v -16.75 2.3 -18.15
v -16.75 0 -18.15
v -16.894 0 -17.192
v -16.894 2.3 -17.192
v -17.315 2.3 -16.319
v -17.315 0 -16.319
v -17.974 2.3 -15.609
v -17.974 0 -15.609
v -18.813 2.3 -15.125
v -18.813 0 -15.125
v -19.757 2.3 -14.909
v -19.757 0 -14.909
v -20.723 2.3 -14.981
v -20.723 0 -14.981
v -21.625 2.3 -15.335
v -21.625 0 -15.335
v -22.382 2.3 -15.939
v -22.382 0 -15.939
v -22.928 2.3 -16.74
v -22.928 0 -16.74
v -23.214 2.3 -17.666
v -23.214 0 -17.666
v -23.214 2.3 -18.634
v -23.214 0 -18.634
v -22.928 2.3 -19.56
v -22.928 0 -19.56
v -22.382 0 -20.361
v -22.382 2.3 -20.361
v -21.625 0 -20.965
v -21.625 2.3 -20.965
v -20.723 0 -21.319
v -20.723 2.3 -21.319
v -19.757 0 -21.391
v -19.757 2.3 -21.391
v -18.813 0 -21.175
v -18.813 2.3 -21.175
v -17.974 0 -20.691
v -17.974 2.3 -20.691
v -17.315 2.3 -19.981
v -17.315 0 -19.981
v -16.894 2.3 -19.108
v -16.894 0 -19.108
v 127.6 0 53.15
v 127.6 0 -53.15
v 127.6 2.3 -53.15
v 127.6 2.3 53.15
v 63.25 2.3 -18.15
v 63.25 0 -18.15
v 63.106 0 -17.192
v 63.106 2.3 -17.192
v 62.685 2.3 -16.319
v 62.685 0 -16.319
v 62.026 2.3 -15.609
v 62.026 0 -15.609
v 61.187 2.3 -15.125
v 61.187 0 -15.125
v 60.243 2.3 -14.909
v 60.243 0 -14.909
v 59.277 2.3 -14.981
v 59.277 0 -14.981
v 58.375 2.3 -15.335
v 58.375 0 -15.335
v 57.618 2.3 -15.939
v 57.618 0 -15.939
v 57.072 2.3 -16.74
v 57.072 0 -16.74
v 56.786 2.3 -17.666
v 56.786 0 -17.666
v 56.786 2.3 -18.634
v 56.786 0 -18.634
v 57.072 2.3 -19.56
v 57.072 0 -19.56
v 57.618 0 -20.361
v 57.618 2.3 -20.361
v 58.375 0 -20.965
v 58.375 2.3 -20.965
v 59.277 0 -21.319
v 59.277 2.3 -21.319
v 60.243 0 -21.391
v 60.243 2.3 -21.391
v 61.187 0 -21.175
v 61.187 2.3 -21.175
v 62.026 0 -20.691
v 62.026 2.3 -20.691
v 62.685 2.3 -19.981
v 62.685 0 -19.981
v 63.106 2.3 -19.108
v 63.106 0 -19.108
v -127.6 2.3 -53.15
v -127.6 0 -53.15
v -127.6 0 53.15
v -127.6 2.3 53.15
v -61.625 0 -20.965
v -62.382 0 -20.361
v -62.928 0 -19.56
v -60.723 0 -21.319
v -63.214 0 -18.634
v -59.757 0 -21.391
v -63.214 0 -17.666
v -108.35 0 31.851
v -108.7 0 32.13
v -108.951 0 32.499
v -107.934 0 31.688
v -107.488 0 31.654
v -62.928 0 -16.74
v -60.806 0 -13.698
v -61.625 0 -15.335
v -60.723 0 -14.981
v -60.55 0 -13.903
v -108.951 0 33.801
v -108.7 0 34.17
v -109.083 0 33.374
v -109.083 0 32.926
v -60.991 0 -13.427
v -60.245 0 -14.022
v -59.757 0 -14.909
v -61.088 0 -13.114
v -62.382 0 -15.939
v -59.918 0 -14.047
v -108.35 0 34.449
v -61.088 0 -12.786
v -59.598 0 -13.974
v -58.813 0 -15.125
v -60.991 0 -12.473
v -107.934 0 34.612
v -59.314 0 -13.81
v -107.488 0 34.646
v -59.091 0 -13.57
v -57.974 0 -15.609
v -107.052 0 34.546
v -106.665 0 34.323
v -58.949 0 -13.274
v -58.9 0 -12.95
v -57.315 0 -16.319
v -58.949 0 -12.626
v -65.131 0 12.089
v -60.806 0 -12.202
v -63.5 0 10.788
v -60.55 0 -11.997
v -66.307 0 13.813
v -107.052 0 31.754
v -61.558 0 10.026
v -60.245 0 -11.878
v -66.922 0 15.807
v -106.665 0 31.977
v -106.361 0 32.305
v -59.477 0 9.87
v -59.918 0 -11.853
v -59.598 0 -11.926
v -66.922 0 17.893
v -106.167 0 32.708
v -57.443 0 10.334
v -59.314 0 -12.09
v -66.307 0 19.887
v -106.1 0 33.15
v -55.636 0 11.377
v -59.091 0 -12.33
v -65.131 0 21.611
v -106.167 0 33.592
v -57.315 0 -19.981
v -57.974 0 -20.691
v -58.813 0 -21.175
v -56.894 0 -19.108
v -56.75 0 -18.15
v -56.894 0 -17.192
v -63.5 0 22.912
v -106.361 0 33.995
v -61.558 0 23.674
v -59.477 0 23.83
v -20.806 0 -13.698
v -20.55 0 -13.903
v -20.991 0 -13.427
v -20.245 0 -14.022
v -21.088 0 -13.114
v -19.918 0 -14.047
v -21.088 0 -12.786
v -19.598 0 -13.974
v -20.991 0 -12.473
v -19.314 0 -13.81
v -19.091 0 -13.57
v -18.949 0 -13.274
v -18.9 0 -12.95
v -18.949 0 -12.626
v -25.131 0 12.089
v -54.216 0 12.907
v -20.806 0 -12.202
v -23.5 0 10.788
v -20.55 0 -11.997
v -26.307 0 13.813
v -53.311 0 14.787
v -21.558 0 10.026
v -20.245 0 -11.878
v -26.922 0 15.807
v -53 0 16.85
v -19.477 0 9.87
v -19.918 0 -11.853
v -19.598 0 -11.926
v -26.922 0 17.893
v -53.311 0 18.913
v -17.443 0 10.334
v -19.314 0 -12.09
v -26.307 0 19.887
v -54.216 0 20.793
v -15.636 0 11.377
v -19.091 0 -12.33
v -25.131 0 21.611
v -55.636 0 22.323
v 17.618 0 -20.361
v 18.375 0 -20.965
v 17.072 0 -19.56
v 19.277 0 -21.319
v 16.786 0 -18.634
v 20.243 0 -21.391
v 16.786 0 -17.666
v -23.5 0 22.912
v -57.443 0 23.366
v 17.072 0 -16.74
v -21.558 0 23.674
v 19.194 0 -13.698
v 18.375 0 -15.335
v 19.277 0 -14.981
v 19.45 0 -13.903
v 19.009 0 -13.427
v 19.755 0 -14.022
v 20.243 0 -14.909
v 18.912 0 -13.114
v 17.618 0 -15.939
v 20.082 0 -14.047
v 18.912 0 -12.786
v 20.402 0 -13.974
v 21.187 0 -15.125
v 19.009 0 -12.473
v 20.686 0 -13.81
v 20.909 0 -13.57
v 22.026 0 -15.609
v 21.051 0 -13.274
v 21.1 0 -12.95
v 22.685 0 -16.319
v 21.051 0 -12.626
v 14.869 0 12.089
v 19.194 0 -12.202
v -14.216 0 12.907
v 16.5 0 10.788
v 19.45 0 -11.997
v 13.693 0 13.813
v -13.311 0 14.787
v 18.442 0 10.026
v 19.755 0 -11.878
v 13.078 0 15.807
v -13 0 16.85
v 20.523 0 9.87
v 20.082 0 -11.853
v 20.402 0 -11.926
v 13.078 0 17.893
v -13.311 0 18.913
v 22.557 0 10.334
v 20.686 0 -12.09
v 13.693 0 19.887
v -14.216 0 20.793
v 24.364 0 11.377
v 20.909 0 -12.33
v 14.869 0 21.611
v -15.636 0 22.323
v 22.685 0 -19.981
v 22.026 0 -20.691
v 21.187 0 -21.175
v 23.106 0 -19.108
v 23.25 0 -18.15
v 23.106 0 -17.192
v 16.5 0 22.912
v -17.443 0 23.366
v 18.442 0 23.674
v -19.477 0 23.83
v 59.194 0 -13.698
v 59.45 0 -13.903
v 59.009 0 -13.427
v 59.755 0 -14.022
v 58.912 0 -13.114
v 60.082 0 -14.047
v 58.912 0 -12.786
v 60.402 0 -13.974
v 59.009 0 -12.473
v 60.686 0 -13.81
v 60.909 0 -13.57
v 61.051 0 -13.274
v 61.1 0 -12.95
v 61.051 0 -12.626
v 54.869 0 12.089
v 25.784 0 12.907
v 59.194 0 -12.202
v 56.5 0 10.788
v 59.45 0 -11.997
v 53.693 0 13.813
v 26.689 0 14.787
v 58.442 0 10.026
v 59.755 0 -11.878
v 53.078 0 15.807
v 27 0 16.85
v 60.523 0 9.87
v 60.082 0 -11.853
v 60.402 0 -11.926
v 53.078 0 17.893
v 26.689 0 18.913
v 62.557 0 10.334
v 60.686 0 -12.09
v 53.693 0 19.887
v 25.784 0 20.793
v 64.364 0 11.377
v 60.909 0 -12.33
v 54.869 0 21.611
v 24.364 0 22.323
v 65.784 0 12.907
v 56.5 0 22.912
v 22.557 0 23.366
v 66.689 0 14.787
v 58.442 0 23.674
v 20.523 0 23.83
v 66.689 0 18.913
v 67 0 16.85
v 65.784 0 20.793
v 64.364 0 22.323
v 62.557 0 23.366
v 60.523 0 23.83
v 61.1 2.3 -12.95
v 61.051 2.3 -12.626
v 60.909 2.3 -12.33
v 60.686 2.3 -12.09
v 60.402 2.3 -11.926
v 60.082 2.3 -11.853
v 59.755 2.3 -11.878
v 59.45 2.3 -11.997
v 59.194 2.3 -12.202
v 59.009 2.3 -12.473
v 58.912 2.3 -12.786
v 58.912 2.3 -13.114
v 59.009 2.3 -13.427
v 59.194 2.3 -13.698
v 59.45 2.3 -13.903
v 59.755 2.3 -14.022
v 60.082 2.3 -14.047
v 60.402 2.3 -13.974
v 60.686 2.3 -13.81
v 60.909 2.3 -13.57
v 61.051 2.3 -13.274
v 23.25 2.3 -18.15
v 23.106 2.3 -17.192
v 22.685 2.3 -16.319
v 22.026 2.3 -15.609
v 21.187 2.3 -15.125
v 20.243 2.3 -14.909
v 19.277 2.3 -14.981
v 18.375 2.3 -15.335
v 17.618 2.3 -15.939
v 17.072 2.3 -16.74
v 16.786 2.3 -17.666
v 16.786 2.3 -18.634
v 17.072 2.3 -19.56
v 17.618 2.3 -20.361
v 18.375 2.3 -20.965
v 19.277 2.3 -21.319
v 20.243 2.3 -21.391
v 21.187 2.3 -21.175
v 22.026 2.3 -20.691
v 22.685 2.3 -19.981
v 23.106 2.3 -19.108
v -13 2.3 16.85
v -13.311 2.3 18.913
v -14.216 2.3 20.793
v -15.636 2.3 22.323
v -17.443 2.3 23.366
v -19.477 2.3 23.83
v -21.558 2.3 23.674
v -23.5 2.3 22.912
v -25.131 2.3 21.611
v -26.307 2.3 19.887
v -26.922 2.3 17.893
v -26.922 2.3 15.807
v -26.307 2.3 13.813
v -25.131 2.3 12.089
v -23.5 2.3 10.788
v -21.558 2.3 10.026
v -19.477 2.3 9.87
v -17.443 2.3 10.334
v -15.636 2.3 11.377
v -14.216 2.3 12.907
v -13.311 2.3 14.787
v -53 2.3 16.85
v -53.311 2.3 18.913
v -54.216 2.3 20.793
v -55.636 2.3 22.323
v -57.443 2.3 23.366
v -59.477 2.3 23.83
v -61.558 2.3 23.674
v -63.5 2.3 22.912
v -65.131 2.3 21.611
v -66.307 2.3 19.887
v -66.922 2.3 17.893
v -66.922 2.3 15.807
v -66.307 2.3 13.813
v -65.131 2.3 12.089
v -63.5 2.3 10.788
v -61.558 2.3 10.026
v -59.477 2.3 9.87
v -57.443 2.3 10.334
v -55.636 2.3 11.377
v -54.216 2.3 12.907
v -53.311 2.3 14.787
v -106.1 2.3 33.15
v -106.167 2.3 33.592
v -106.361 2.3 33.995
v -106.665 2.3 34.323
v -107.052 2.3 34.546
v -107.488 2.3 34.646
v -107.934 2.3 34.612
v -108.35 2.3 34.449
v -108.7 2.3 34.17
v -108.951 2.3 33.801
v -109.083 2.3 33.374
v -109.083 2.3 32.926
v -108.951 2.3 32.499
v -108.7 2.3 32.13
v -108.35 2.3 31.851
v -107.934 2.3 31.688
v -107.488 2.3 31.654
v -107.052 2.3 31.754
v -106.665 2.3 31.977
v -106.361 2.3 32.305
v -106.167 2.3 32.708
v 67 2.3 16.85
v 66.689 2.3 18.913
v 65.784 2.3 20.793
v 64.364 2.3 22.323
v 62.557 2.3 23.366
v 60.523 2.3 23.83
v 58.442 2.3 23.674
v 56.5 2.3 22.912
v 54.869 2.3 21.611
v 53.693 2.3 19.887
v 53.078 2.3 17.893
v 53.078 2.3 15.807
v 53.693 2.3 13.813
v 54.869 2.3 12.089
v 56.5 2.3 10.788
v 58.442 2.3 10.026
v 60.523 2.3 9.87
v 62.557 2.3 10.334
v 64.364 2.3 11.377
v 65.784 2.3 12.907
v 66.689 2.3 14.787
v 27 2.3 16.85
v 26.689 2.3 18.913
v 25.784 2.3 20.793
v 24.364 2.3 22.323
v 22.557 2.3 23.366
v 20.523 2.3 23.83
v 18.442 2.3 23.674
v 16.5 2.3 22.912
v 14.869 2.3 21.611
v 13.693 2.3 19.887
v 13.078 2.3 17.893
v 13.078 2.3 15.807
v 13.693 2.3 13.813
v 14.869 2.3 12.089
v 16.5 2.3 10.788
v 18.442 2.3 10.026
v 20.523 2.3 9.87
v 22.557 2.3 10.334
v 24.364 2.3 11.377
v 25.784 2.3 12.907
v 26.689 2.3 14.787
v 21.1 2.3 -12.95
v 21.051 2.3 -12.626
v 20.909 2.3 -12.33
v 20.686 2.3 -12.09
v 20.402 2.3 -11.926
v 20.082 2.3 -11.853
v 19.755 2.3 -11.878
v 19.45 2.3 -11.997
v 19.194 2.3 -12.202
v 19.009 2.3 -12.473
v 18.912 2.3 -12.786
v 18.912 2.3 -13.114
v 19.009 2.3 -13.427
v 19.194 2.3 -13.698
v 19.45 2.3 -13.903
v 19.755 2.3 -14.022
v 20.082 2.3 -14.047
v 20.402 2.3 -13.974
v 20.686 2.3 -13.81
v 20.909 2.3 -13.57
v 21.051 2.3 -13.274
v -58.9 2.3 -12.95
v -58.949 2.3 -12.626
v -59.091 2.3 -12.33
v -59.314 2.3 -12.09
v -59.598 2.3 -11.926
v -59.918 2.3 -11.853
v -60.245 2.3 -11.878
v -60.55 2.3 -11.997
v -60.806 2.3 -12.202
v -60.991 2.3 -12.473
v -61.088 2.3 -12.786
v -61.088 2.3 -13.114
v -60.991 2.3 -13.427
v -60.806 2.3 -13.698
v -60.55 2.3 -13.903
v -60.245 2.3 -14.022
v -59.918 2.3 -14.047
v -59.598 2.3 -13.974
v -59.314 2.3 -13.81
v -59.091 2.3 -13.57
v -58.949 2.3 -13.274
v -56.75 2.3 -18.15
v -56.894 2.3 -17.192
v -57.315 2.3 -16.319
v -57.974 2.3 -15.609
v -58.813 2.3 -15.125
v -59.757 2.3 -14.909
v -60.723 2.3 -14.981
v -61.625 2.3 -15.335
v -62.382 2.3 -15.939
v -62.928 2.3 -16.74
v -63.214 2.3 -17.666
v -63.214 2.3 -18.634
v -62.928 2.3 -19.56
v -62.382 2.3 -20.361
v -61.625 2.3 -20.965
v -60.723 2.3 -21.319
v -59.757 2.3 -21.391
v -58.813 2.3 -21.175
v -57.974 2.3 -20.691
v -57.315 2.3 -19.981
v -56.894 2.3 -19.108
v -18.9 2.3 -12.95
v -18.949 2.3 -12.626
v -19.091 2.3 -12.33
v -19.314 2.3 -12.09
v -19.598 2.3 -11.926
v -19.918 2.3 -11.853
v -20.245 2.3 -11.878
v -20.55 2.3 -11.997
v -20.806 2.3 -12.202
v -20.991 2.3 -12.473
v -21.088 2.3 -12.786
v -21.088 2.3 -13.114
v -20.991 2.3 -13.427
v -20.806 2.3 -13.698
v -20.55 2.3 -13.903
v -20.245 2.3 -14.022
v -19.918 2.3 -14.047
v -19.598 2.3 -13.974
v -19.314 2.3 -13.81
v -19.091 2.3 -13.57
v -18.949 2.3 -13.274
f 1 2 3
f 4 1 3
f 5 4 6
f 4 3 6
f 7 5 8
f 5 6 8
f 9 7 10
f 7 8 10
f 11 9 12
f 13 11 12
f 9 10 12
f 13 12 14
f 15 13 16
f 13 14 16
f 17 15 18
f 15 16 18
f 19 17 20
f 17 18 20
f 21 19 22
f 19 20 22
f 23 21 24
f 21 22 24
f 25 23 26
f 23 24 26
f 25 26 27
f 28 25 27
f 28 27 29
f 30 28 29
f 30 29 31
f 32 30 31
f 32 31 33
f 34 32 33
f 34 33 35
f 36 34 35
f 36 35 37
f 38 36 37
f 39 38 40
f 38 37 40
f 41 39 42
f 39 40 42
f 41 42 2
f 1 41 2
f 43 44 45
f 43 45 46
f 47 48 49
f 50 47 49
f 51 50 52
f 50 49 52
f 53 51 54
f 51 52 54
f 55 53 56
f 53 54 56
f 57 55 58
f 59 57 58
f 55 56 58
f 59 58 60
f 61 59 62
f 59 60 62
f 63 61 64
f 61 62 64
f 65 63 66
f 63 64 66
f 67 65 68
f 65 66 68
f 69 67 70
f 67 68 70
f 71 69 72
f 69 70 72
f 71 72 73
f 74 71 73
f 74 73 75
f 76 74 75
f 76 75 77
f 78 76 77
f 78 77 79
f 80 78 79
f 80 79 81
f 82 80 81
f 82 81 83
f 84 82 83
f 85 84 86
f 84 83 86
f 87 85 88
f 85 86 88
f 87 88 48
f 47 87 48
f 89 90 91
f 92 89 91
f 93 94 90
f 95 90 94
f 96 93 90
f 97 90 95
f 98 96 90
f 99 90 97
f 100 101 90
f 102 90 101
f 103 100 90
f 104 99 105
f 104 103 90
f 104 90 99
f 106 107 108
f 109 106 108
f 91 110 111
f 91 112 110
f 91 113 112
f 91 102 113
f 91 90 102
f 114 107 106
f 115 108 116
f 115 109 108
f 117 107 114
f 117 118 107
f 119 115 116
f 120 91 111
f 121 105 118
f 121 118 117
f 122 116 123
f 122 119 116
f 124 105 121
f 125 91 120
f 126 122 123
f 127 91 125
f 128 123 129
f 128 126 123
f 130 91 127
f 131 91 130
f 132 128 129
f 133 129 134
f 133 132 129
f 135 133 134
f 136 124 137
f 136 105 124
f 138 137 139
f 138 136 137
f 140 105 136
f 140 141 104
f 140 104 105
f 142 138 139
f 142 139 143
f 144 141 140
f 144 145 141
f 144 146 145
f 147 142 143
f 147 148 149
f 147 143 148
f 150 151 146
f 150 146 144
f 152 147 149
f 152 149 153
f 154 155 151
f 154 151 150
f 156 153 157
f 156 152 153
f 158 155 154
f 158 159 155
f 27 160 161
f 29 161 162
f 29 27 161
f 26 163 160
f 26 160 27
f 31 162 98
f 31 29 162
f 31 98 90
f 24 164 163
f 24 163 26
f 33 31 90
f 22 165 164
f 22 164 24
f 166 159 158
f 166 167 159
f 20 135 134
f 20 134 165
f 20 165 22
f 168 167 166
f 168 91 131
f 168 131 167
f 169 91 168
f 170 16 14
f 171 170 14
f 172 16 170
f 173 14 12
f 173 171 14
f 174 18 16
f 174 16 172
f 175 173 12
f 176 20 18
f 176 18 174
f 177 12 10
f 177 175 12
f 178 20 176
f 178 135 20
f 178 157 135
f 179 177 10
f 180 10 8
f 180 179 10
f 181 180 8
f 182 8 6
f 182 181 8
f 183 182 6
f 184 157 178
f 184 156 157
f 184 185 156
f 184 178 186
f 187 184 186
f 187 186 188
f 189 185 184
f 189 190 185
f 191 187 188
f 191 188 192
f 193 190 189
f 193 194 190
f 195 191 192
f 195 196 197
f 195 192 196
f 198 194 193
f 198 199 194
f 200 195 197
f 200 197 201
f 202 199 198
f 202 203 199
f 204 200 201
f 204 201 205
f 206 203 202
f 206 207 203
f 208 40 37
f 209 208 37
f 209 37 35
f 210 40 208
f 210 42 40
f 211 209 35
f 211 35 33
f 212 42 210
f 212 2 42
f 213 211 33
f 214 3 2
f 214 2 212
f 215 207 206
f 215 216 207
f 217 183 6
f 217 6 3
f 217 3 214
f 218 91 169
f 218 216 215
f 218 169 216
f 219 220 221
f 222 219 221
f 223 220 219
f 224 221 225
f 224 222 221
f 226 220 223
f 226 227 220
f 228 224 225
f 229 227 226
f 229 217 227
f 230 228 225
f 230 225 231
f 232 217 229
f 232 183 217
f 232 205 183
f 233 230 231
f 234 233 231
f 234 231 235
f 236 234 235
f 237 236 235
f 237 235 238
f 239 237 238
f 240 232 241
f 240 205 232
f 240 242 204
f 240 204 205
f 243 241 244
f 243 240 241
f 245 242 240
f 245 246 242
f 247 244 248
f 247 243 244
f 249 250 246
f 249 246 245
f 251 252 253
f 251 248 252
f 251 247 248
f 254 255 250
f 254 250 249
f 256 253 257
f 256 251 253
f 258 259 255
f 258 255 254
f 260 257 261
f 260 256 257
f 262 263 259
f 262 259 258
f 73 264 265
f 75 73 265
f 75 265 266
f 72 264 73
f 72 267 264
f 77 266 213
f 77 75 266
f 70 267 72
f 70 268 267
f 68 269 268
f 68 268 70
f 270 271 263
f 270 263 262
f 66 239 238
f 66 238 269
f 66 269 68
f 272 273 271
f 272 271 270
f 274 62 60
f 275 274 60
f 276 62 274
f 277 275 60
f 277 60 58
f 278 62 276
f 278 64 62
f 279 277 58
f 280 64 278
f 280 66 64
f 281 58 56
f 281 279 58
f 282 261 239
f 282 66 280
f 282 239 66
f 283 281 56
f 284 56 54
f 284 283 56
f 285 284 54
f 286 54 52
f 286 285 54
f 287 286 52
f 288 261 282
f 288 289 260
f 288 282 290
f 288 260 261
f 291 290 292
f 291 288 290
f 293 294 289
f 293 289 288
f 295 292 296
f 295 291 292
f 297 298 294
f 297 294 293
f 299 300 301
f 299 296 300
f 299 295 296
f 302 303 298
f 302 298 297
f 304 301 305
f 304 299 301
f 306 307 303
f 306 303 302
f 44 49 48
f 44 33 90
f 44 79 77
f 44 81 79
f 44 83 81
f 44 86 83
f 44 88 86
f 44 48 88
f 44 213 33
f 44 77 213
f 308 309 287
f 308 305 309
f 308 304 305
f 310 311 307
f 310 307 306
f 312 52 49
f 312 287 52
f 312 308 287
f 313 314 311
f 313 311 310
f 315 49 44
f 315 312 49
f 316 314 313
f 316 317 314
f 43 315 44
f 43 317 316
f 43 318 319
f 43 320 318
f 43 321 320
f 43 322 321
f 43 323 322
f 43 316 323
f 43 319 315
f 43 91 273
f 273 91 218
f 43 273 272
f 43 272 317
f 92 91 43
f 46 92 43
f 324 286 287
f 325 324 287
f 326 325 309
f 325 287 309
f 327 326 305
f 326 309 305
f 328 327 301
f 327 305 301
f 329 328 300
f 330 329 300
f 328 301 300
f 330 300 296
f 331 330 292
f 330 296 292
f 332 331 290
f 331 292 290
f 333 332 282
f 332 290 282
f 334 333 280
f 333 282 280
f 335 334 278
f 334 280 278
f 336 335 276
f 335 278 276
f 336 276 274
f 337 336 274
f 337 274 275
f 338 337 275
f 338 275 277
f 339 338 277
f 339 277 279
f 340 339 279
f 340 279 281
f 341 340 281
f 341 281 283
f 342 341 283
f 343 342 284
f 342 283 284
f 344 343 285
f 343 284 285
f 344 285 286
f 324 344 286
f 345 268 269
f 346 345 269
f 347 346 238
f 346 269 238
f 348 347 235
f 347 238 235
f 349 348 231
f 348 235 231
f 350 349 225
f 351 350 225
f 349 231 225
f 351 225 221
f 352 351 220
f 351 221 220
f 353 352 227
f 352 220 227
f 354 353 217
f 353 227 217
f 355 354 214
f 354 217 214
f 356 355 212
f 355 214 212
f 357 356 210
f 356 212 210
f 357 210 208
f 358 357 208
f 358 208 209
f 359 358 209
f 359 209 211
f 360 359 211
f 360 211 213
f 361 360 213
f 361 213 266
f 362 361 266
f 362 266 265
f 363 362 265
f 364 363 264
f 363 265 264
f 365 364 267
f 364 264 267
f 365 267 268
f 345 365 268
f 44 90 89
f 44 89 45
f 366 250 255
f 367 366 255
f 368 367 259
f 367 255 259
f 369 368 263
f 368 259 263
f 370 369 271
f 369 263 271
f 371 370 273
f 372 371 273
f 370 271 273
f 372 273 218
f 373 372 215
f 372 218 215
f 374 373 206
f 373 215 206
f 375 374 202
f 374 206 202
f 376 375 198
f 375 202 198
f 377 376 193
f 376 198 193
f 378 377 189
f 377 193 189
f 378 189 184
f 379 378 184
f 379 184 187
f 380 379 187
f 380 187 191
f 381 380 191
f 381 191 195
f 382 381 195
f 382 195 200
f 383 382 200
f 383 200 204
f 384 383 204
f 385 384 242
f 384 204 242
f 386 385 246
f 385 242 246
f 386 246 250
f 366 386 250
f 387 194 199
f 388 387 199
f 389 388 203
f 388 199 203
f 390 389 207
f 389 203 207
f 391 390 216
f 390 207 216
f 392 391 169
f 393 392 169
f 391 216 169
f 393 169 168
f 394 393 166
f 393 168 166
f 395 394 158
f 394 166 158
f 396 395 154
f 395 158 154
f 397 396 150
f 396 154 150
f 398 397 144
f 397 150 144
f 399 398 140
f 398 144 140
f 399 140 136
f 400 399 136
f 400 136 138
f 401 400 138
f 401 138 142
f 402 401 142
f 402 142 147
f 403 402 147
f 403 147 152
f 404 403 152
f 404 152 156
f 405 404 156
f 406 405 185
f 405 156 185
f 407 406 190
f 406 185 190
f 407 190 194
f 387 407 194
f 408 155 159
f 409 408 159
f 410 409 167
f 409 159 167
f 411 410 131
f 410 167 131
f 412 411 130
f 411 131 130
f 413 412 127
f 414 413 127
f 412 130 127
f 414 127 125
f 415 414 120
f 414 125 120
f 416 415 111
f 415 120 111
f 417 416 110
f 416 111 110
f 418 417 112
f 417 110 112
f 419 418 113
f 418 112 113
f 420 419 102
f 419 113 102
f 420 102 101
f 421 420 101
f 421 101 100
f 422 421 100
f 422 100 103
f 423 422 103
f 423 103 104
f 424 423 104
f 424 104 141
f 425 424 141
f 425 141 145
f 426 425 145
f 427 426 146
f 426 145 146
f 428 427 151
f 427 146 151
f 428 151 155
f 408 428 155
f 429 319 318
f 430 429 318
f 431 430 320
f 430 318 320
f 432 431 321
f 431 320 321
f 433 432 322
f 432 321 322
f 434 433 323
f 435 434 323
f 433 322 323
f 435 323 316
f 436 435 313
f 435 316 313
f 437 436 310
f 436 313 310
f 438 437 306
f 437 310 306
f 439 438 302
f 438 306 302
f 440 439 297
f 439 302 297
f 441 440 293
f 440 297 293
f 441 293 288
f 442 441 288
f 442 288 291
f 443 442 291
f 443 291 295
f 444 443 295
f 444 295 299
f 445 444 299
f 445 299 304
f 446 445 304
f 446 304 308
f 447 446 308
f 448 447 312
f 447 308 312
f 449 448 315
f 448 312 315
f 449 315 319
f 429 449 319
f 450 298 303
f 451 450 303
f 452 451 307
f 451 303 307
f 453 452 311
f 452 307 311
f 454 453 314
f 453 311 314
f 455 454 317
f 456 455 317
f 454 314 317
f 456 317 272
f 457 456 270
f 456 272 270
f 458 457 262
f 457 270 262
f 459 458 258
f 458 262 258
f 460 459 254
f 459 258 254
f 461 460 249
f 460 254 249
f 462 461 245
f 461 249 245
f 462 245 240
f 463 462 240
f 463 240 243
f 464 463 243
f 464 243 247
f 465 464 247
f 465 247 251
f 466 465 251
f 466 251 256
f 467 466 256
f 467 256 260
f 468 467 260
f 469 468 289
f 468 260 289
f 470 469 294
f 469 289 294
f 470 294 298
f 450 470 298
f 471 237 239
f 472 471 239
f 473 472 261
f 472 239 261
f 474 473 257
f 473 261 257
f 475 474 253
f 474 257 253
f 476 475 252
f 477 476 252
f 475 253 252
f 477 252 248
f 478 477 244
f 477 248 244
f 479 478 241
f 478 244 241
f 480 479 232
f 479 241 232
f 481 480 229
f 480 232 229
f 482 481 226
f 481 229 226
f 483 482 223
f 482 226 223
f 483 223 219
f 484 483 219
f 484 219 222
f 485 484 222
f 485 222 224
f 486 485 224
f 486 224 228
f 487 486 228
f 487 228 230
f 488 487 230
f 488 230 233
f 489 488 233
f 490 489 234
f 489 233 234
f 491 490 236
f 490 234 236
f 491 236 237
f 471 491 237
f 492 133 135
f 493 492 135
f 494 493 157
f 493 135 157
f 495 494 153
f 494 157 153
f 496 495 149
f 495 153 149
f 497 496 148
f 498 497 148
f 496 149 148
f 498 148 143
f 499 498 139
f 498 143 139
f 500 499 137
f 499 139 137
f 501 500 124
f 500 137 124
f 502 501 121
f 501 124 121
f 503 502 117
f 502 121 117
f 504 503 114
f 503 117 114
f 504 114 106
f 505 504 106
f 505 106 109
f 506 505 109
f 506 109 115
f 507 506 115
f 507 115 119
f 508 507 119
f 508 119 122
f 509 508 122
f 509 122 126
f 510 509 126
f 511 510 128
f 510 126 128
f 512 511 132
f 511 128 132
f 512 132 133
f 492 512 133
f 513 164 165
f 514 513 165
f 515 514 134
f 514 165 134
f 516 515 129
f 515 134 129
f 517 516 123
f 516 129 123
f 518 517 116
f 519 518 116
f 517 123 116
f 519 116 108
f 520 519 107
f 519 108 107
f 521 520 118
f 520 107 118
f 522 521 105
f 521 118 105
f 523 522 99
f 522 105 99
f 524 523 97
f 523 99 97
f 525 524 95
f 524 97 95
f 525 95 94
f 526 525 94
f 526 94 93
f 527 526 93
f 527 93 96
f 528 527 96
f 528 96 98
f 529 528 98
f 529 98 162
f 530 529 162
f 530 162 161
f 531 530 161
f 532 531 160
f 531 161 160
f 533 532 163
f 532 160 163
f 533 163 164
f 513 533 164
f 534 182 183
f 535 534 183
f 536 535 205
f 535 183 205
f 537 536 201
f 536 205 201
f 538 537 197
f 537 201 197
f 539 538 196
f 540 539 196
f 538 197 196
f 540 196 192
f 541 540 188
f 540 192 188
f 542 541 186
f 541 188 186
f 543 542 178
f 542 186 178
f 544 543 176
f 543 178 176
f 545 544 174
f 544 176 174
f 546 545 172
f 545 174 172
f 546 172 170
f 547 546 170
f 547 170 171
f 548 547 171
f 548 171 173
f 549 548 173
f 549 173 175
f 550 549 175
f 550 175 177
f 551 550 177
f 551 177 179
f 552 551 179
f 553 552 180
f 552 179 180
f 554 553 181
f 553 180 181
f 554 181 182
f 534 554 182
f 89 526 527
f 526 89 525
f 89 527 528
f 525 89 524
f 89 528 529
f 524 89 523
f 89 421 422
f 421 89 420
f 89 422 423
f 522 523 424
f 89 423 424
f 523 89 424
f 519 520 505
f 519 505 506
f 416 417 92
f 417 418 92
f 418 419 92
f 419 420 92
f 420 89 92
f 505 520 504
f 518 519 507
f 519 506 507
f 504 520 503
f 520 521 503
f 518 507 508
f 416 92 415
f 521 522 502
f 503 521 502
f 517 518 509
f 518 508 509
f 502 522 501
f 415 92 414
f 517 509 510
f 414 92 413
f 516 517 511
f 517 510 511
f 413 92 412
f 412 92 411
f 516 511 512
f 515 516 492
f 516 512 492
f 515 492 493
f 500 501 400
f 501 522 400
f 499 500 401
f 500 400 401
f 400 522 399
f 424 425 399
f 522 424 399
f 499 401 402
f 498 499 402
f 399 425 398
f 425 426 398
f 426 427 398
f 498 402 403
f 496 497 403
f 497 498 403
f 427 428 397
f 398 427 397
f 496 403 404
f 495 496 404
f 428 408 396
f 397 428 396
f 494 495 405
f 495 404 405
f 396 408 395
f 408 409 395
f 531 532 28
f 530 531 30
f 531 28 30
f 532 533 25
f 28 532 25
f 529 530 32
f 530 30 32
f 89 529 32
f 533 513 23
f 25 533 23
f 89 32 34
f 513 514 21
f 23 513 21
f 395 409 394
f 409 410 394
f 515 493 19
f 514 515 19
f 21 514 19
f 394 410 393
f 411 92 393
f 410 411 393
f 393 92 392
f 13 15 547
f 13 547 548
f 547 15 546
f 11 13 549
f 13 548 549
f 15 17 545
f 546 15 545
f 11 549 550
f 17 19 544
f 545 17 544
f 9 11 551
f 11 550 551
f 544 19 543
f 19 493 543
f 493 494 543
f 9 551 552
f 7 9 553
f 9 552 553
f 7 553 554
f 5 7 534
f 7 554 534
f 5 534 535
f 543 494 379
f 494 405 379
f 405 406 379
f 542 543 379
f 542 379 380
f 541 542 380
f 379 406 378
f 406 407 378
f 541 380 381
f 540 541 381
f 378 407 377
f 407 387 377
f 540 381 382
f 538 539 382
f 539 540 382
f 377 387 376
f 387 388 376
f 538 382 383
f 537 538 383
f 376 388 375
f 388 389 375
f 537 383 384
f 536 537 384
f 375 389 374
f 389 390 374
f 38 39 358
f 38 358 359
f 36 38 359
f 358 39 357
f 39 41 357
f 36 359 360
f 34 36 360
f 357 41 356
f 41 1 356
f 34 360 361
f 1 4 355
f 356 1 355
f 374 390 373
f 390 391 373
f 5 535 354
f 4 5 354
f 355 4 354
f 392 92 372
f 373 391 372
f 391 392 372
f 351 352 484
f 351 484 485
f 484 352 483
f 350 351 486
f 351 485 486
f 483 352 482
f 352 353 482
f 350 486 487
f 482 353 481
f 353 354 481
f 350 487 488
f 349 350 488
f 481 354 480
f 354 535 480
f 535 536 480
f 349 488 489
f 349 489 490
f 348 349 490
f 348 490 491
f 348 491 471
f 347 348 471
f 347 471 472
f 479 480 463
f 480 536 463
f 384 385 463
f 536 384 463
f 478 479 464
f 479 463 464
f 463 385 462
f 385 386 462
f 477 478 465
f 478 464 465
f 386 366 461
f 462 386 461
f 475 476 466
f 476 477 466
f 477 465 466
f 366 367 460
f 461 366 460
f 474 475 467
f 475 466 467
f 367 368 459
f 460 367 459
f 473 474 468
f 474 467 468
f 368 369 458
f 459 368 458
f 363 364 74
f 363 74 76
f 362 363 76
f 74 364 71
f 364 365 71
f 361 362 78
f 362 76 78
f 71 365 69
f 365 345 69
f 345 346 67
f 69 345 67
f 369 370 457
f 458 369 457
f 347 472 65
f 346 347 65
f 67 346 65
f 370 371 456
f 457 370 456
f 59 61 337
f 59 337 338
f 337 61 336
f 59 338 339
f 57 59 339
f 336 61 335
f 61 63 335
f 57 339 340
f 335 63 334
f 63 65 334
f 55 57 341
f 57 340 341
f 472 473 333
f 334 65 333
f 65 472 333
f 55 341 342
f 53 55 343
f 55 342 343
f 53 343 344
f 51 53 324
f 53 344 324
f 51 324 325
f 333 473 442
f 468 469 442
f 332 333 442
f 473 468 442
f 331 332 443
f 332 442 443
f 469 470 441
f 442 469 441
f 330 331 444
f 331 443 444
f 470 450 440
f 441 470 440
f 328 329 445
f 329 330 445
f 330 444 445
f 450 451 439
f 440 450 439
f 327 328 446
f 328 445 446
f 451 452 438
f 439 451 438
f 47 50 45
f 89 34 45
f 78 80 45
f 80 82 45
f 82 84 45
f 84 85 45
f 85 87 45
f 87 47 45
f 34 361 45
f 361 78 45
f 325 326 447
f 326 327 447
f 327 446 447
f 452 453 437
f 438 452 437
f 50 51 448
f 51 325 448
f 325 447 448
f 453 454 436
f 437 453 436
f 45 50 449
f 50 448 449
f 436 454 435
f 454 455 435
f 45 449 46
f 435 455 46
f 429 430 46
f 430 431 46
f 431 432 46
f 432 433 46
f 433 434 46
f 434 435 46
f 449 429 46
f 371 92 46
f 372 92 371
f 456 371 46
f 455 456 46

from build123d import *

# Parameters (mm, degrees)
F0_W     = 255.2
F0_H     = 106.3
F0_R     = 3.25
F0_R_2   = 1.1
F0_R_3   = 7
F0_R_4   = 1.5
F1_DEPTH = 2.3


with BuildPart() as f1:
    # F0 (on Front) → F1 (new body)
    with BuildSketch(Plane.XZ):
        Rectangle(F0_W, F0_H)
        with Locations((-60, -18.15)):
            Circle(F0_R, mode=Mode.SUBTRACT)
        with Locations((-20, -18.15)):
            Circle(F0_R, mode=Mode.SUBTRACT)
        with Locations((-60, -12.95)):
            Circle(F0_R_2, mode=Mode.SUBTRACT)
        with Locations((-20, -12.95)):
            Circle(F0_R_2, mode=Mode.SUBTRACT)
        with Locations((20, -18.15)):
            Circle(F0_R, mode=Mode.SUBTRACT)
        with Locations((60, -18.15)):
            Circle(F0_R, mode=Mode.SUBTRACT)
        with Locations((20, -12.95)):
            Circle(F0_R_2, mode=Mode.SUBTRACT)
        with Locations((60, -12.95)):
            Circle(F0_R_2, mode=Mode.SUBTRACT)
        with Locations((-60, 16.85)):
            Circle(F0_R_3, mode=Mode.SUBTRACT)
        with Locations((-20, 16.85)):
            Circle(F0_R_3, mode=Mode.SUBTRACT)
        with Locations((-107.6, 33.15)):
            Circle(F0_R_4, mode=Mode.SUBTRACT)
        with Locations((20, 16.85)):
            Circle(F0_R_3, mode=Mode.SUBTRACT)
        with Locations((60, 16.85)):
            Circle(F0_R_3, mode=Mode.SUBTRACT)
    extrude(amount=-F1_DEPTH)


solid = f1.part
